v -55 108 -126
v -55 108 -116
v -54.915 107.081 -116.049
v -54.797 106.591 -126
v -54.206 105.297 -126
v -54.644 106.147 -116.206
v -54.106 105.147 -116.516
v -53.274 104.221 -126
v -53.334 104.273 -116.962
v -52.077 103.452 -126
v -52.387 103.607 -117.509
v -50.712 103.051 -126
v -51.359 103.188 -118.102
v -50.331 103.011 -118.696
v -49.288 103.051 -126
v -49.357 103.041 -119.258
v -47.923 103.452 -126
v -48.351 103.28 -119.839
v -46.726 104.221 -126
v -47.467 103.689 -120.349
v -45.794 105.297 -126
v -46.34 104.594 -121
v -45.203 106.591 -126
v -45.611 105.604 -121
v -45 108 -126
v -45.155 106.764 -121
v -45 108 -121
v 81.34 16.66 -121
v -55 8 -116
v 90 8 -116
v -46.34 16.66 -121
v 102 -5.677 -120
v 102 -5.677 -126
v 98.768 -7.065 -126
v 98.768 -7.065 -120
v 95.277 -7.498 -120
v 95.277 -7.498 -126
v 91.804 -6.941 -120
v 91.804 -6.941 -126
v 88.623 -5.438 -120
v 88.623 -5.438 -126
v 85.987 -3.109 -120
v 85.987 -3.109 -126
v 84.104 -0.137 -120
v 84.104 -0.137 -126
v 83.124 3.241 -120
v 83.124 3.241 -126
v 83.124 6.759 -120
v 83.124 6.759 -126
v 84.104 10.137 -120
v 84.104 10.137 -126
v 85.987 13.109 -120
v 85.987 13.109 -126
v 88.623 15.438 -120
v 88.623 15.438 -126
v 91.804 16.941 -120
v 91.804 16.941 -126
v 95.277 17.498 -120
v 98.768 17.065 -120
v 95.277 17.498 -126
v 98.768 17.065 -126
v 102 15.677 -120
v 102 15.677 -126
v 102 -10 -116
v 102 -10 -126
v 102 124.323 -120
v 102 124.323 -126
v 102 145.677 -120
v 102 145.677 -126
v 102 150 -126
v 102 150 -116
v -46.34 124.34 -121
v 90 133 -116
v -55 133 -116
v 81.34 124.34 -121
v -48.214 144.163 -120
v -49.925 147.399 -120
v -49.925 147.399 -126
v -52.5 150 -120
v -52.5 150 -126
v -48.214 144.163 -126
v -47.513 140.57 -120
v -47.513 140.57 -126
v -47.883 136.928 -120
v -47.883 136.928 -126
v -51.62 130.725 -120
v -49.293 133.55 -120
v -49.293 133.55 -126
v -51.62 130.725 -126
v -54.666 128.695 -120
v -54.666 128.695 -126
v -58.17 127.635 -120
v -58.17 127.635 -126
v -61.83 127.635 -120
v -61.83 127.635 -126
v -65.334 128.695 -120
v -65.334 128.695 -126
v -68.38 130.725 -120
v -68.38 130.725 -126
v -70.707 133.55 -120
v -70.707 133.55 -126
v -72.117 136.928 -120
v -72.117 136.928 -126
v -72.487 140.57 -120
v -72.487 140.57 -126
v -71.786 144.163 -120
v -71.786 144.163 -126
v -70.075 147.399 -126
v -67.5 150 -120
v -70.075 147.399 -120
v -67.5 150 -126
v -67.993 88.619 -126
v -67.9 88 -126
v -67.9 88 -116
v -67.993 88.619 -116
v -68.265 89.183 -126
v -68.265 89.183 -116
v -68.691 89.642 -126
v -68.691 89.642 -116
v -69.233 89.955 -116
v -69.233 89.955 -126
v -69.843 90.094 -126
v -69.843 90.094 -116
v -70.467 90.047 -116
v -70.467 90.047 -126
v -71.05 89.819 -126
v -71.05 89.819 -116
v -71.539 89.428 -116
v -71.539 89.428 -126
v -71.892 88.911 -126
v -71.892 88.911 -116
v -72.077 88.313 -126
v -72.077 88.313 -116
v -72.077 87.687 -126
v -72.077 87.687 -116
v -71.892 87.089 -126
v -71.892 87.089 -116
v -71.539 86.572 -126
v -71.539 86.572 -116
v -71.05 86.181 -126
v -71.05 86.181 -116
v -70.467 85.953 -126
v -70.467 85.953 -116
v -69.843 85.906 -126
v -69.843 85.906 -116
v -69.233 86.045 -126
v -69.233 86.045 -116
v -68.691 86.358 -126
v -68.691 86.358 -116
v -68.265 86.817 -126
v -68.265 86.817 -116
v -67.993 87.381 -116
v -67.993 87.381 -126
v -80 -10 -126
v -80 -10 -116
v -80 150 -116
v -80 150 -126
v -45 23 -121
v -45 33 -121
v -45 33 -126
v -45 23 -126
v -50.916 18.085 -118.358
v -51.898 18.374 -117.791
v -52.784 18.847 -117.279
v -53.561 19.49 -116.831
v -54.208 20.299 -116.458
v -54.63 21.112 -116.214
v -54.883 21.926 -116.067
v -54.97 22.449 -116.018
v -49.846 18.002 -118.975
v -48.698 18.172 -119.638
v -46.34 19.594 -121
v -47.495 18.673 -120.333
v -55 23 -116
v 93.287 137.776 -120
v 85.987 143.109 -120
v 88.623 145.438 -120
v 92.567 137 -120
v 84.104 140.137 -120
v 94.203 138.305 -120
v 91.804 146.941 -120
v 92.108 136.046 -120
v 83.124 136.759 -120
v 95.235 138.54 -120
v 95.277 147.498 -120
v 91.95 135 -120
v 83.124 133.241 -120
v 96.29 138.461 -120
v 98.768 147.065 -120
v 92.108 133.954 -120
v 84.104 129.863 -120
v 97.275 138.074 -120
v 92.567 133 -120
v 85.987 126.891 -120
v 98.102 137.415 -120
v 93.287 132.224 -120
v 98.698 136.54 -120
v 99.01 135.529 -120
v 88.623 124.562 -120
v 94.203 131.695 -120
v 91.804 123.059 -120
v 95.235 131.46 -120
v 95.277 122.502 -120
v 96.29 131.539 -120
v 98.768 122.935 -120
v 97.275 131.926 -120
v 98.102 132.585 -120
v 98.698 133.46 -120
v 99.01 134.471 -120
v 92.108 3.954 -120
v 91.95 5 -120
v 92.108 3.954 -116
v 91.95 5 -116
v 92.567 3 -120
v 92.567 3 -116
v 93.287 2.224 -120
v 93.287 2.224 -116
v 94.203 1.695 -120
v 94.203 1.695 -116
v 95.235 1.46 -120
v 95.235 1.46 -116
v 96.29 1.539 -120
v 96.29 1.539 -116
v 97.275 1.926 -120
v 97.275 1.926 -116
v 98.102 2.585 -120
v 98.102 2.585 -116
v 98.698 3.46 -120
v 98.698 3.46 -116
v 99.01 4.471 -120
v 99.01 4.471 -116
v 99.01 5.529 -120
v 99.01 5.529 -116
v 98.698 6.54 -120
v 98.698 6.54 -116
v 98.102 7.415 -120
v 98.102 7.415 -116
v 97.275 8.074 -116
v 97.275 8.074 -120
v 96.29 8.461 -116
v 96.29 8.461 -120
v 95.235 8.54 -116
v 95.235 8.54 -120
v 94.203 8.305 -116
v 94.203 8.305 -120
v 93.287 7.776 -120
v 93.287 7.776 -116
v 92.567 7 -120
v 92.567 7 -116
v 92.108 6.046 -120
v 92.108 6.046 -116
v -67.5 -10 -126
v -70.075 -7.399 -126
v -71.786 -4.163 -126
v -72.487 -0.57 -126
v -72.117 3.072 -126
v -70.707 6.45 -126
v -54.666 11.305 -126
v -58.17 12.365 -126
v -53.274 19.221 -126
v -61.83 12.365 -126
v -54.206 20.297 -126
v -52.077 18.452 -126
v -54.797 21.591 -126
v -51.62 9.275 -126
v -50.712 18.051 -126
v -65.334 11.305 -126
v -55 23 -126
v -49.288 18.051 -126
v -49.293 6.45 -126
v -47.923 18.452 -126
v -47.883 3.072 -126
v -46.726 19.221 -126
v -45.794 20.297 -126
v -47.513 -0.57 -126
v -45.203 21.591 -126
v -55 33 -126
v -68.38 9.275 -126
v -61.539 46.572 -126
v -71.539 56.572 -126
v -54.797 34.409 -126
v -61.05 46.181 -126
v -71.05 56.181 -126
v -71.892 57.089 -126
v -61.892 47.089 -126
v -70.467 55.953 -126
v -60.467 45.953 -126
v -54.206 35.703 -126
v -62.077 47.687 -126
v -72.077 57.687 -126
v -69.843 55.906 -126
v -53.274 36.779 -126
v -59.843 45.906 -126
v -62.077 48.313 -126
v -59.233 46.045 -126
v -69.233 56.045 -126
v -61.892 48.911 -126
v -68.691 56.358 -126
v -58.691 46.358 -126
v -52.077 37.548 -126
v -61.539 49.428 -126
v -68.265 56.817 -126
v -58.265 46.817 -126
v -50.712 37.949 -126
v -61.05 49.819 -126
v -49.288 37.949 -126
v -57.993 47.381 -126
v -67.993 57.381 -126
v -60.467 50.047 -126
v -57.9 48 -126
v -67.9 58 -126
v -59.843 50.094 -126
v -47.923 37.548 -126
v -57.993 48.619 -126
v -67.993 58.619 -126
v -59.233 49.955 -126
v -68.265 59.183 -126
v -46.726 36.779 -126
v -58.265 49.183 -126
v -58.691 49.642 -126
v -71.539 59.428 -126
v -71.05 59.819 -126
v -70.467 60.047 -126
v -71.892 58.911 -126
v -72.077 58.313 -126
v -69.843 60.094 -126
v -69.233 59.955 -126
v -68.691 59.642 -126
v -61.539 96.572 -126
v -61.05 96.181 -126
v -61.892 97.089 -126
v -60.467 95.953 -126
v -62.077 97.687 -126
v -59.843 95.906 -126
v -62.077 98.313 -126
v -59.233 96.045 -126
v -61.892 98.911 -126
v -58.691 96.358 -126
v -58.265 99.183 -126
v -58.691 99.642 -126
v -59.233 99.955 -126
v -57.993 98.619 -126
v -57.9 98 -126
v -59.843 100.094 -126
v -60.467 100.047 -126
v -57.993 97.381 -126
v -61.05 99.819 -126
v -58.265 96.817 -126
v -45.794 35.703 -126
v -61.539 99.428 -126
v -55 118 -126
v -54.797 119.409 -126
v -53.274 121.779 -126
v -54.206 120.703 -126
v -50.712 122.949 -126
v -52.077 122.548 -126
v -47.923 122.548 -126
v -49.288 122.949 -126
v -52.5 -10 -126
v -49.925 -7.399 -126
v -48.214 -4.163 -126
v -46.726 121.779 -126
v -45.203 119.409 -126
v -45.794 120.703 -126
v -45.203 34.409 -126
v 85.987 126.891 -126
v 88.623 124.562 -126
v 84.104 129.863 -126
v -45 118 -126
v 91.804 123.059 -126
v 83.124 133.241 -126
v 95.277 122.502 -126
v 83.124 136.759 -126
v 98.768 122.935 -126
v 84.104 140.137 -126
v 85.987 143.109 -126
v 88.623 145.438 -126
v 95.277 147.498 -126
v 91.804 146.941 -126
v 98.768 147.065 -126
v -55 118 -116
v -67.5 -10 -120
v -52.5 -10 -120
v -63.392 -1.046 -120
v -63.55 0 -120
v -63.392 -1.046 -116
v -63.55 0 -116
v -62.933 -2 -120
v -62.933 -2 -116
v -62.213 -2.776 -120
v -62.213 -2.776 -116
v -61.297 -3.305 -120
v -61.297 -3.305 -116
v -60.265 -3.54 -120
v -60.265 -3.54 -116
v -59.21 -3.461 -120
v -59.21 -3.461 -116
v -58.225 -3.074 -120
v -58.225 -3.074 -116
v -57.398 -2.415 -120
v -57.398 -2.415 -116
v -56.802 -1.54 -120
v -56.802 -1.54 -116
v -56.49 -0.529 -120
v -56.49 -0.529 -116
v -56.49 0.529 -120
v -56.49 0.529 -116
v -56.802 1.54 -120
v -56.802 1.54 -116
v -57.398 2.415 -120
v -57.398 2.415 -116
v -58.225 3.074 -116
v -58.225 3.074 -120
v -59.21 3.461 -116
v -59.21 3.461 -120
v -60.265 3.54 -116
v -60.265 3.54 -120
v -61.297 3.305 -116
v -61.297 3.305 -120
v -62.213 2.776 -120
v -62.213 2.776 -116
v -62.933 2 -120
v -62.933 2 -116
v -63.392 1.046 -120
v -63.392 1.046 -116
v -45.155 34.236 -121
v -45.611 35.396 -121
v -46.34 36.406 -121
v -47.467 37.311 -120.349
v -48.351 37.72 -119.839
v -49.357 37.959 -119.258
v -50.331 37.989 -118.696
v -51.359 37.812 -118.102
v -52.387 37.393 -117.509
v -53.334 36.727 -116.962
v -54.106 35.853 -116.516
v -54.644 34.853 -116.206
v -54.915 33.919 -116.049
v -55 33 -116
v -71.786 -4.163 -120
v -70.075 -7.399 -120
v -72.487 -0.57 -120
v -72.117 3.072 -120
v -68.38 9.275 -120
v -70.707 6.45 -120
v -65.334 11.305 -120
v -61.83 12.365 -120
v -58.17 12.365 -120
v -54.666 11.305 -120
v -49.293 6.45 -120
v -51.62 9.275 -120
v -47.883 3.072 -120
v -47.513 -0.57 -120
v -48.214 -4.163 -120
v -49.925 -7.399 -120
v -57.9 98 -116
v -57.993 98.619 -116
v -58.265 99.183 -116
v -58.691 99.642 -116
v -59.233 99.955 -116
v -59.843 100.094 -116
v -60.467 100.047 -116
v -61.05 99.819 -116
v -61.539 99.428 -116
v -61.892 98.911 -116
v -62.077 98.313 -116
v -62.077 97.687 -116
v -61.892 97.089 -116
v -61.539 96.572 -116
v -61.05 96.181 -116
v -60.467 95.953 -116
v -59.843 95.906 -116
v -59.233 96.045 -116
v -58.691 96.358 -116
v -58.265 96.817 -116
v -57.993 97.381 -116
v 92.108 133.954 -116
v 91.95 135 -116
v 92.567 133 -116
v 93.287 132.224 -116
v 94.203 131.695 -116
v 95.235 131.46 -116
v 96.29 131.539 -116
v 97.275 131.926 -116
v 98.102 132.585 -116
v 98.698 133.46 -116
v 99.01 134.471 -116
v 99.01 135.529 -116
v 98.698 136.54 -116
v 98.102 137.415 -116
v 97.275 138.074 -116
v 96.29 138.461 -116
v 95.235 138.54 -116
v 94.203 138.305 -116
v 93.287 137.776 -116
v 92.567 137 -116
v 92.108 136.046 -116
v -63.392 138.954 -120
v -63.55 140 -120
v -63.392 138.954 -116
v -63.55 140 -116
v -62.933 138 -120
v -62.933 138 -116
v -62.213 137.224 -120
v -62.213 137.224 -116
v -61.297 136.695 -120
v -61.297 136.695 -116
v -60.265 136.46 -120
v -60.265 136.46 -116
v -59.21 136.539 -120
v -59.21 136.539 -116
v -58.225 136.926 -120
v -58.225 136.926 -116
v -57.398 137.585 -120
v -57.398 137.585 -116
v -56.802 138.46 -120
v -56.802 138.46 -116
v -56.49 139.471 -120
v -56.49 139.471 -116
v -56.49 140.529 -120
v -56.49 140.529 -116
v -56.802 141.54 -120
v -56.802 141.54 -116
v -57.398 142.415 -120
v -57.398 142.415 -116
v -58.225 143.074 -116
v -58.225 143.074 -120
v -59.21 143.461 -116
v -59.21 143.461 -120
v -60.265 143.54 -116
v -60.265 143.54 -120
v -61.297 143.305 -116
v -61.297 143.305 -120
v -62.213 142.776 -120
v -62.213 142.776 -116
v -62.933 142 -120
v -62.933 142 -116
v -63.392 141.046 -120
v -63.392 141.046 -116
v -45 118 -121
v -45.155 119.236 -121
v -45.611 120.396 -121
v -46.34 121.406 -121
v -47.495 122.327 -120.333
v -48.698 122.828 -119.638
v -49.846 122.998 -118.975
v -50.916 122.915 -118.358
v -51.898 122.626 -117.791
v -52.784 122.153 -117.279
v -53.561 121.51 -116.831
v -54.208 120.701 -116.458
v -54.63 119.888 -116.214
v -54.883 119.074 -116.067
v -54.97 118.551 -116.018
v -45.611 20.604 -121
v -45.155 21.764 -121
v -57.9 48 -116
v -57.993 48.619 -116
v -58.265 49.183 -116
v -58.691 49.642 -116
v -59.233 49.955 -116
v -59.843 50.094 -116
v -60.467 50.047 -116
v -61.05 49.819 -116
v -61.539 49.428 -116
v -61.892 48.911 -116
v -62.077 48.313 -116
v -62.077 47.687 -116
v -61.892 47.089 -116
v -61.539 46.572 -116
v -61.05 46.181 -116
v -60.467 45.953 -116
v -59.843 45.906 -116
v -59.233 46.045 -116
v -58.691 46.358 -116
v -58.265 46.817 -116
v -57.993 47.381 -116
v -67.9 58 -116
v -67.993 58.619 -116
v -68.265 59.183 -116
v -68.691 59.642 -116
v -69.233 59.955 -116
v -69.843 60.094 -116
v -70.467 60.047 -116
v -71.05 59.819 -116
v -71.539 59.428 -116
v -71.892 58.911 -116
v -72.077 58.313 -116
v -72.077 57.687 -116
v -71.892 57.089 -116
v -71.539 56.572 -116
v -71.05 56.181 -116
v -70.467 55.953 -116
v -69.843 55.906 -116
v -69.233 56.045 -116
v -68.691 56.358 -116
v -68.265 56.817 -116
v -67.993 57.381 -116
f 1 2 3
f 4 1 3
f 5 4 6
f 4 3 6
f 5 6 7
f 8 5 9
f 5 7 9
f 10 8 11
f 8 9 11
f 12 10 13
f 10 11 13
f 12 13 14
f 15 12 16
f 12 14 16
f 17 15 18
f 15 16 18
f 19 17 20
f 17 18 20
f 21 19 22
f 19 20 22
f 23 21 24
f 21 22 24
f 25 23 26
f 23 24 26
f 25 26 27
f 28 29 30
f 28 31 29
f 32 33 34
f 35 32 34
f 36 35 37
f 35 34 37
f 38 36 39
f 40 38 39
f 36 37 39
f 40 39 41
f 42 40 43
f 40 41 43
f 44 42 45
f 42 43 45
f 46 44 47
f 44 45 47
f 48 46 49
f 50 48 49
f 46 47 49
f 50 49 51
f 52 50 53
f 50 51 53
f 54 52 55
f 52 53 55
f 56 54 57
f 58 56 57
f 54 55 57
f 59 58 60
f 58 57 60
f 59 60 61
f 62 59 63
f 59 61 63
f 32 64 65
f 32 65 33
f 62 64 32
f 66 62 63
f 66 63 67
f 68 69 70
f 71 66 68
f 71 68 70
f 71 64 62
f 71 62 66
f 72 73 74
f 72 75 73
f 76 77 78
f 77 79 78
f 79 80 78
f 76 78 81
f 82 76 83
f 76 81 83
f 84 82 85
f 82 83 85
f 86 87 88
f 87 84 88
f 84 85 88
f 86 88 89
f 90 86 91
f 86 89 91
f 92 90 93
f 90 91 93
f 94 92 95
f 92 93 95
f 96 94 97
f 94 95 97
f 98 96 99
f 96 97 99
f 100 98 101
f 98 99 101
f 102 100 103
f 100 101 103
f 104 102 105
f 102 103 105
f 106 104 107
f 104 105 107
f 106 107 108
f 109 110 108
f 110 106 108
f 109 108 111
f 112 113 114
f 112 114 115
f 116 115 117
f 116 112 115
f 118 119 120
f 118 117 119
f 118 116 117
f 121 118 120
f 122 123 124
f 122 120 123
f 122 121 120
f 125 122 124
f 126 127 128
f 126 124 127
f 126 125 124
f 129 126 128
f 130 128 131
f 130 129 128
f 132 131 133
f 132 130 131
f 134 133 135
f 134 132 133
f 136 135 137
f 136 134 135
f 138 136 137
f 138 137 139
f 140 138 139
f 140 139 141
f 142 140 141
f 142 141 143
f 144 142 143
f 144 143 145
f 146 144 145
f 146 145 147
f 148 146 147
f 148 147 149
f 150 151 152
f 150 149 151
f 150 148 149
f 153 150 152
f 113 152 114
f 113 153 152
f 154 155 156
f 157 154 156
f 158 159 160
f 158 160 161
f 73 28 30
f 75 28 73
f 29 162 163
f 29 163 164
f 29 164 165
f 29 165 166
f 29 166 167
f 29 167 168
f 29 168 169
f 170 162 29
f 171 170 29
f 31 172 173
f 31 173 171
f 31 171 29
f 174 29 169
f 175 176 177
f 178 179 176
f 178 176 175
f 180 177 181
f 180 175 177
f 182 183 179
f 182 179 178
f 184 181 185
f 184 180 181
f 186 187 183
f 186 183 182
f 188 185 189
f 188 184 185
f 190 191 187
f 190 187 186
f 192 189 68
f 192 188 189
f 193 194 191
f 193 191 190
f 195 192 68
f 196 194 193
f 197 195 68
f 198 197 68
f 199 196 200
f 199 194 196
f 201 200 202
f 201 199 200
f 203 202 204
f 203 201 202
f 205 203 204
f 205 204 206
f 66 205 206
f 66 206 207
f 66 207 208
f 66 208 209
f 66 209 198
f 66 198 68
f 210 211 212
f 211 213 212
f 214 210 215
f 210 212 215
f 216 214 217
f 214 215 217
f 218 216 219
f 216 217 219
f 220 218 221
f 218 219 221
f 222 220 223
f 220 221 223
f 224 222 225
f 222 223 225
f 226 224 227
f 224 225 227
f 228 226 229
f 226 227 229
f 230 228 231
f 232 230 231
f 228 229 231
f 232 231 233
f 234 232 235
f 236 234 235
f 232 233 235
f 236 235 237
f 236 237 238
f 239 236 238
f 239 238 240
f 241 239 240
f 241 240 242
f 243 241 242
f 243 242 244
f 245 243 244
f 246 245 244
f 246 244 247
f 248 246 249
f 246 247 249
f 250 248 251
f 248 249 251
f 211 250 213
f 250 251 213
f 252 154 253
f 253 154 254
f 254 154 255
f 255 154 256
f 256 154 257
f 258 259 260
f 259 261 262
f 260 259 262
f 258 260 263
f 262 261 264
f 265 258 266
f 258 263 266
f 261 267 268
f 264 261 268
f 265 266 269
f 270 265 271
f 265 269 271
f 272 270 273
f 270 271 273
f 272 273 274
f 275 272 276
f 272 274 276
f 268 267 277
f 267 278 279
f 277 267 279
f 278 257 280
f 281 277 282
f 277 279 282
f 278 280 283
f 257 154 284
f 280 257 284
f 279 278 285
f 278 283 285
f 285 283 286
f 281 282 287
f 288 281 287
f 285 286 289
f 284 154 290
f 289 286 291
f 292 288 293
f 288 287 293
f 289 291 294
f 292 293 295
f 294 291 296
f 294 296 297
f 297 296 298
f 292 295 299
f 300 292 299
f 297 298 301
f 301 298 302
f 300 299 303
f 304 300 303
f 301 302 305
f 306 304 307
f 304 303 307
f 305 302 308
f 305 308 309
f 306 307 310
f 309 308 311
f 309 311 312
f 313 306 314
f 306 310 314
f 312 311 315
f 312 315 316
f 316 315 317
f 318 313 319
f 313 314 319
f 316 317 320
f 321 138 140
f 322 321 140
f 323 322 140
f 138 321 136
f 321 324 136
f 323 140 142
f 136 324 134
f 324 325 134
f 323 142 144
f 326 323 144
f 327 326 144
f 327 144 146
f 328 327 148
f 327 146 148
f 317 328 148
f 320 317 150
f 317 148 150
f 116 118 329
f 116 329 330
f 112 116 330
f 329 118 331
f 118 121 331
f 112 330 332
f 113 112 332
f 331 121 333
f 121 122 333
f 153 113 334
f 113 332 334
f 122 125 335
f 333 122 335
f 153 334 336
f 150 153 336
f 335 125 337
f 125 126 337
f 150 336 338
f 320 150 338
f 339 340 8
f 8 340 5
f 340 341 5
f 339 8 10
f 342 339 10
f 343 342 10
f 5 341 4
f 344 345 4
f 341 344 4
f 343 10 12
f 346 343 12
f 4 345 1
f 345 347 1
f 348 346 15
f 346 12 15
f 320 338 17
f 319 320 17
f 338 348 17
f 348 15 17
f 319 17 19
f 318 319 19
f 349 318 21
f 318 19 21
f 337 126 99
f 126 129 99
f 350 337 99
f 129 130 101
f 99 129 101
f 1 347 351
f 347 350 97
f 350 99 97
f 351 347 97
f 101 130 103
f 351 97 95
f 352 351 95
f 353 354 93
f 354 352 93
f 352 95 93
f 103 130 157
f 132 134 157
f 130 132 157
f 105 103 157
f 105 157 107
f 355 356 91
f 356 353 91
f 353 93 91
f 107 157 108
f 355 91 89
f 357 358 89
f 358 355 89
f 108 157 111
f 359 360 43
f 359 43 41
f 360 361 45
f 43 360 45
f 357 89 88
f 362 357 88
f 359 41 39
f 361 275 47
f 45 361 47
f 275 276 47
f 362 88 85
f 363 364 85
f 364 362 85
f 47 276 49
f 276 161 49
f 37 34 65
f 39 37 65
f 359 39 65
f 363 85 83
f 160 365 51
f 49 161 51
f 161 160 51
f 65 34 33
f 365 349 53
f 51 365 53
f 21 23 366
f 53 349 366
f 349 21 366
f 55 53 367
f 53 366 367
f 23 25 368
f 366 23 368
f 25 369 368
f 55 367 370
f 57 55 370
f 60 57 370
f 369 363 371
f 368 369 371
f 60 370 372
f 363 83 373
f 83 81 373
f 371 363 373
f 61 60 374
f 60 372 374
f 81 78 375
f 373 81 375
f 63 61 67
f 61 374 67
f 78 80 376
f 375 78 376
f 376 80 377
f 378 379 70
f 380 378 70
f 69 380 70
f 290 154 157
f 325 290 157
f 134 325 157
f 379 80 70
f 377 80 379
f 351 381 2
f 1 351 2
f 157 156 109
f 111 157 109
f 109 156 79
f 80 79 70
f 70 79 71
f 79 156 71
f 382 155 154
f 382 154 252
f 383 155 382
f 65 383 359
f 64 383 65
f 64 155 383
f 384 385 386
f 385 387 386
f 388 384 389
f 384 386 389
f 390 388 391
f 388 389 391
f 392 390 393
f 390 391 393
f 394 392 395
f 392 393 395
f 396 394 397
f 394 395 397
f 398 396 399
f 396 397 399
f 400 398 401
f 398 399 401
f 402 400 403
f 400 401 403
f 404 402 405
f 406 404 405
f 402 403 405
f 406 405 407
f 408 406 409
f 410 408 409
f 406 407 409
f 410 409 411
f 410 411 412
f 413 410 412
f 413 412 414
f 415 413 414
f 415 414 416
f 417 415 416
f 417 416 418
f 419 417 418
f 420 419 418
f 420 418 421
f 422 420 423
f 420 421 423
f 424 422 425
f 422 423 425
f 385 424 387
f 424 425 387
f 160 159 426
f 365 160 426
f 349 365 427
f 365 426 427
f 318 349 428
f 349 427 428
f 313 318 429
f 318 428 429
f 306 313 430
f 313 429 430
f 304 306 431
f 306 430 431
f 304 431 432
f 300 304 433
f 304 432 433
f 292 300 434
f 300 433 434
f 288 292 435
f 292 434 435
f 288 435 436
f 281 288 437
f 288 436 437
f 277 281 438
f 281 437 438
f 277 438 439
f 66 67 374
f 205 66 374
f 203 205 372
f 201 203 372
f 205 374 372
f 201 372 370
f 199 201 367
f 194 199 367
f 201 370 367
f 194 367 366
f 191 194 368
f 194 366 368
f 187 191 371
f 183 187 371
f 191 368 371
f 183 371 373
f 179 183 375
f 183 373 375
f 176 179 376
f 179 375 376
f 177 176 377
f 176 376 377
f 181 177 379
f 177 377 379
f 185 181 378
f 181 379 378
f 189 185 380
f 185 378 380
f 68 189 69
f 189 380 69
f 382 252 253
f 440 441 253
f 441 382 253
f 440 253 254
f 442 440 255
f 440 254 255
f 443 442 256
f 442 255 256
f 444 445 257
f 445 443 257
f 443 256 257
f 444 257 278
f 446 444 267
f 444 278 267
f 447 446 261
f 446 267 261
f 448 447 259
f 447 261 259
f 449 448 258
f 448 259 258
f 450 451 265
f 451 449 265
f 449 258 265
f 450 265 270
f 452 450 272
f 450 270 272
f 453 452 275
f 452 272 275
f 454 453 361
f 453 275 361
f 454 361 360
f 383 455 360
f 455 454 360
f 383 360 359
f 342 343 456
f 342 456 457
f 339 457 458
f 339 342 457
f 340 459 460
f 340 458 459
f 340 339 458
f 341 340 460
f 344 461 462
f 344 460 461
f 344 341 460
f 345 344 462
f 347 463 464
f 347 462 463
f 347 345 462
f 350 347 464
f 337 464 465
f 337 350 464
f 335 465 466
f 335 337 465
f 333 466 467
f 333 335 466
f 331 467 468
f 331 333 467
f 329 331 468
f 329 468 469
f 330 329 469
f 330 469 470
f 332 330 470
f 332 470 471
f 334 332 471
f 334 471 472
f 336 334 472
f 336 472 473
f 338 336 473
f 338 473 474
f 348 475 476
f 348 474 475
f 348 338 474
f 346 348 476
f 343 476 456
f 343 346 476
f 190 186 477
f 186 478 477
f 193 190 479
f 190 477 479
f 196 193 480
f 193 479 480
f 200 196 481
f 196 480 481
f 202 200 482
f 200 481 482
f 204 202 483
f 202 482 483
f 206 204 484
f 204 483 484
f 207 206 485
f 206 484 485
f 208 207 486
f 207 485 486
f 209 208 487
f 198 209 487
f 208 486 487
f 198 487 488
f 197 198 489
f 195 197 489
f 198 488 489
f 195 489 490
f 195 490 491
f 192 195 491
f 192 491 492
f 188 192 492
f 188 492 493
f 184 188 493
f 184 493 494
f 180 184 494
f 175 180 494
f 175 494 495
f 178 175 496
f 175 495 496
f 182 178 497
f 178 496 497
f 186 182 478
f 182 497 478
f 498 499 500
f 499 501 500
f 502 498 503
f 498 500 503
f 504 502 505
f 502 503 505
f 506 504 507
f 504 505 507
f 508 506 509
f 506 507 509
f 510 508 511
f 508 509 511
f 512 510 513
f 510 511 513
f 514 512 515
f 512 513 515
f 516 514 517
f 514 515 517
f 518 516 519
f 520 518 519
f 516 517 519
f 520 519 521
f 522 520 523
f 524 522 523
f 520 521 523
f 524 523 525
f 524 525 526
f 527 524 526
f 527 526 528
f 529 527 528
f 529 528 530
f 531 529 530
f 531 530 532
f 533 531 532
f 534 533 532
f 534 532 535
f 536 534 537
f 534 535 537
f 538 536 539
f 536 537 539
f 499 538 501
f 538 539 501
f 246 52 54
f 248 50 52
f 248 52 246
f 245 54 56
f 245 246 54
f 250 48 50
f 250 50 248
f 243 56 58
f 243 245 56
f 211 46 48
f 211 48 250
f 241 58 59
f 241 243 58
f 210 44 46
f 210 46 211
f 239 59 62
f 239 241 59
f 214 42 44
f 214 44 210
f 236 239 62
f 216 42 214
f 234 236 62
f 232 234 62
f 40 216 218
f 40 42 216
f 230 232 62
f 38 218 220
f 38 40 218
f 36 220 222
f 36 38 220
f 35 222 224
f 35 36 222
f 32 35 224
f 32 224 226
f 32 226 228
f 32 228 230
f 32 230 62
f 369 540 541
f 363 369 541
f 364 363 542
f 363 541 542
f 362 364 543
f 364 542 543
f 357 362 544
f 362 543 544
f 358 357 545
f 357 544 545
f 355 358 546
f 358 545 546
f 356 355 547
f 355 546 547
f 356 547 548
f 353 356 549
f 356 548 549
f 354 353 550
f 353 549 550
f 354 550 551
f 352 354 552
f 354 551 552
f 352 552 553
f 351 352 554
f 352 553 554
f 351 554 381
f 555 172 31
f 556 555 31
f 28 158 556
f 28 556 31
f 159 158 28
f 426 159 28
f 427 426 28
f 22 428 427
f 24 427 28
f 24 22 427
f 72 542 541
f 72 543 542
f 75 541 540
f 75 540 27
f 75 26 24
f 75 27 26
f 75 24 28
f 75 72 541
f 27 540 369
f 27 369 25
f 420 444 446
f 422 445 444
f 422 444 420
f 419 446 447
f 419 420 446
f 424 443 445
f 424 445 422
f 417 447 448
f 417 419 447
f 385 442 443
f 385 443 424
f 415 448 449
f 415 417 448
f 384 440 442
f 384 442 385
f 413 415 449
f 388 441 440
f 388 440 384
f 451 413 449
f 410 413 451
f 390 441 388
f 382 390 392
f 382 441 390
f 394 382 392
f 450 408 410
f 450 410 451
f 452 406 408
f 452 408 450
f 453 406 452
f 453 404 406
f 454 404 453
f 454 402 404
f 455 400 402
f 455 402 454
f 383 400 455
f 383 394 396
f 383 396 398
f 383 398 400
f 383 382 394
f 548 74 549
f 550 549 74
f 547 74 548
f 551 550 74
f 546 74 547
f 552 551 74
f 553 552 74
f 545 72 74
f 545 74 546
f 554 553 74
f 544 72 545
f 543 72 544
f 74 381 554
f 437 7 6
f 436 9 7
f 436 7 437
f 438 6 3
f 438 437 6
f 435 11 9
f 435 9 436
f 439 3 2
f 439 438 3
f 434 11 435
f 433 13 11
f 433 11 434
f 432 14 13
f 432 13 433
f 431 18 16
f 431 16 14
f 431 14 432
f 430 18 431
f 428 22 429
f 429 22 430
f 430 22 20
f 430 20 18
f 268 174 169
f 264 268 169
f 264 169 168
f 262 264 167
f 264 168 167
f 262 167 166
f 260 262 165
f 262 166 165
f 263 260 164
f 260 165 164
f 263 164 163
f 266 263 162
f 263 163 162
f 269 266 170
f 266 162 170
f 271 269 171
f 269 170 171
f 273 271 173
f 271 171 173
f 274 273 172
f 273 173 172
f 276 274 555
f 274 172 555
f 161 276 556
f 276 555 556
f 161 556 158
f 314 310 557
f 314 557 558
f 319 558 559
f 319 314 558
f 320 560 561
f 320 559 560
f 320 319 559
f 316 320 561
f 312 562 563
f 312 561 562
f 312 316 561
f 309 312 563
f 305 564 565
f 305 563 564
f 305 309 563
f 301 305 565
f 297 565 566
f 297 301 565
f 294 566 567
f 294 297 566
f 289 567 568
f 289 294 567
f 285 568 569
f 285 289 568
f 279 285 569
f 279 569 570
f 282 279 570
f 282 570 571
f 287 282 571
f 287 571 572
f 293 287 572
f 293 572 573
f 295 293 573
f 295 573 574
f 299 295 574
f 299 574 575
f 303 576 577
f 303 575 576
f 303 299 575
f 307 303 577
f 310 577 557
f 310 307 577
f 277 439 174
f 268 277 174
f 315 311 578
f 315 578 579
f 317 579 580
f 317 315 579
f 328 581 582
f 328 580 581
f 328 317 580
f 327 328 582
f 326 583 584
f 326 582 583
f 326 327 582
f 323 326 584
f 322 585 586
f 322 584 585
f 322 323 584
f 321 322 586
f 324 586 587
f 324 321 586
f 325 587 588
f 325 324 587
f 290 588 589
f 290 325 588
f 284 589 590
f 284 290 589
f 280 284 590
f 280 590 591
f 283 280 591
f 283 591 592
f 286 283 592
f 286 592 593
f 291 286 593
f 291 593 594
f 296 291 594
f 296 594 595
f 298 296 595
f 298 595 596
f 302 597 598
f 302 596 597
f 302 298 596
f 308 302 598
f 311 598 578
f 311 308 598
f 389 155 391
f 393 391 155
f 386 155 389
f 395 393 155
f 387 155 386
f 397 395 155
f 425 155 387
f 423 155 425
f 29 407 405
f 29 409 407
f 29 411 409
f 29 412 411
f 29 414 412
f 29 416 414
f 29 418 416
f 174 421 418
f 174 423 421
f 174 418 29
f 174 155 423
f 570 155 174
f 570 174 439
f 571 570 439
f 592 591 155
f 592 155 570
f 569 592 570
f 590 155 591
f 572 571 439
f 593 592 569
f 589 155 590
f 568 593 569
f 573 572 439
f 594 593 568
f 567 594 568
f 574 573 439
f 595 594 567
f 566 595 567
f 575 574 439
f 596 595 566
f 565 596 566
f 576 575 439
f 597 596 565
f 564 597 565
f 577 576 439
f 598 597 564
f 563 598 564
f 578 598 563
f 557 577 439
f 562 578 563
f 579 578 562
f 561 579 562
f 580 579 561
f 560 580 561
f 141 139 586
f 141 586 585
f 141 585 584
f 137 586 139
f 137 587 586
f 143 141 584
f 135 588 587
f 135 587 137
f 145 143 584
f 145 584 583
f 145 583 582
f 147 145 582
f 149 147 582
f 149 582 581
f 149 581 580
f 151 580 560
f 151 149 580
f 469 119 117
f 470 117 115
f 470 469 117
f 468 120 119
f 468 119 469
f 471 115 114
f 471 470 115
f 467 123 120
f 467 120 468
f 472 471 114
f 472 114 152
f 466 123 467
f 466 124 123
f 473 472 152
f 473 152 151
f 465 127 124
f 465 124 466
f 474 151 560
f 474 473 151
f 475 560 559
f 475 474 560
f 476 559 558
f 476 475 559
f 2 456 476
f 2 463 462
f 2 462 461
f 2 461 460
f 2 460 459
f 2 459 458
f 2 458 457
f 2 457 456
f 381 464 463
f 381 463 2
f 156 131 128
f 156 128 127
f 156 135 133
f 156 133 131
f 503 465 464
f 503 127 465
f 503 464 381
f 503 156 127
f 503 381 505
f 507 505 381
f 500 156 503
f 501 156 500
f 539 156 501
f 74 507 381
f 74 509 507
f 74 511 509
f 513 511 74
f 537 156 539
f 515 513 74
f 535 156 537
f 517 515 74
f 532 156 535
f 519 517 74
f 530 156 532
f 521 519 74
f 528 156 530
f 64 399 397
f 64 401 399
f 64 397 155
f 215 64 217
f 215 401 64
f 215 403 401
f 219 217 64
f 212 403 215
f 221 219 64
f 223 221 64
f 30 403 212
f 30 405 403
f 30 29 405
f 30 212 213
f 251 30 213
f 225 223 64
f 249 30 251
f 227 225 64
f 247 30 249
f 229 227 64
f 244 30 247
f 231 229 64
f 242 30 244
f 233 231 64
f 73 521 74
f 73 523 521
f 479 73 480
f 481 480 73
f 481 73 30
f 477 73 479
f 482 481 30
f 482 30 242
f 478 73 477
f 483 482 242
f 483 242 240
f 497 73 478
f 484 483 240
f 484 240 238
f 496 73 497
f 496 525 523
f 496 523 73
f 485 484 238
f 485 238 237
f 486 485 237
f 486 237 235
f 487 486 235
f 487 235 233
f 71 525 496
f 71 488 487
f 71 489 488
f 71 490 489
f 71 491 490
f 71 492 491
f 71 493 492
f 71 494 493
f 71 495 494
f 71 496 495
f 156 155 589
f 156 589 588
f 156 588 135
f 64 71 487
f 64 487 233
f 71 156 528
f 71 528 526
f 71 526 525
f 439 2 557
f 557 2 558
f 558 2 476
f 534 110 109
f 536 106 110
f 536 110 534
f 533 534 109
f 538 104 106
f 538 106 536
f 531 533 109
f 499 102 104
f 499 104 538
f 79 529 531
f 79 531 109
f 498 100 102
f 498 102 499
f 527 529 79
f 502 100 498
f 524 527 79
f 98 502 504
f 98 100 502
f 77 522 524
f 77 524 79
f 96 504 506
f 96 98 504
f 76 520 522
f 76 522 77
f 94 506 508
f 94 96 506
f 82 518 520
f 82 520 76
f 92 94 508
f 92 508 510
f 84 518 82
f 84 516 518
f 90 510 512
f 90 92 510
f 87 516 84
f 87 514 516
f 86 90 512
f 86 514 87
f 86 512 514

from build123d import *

# Parameters (mm, degrees)
SKETCH014_W         = 182
SKETCH014_H         = 160
PAD007_DEPTH        = 10
HOLE006_D           = 7.1
HOLE006_DEPTH       = 52
HOLE006_CBORE_D     = 25
HOLE006_CBORE_DEPTH = 16
POCKET002_DEPTH     = 29
SKETCH018_W         = 145
SKETCH018_H         = 125
POCKET003_DEPTH     = 5
POCKET003_TAPER     = 60
SKETCH019_R         = 2.1
HOLE007_DEPTH       = 25


with BuildPart() as part:
    # Sketch014 → Pad007 (new body)
    with BuildSketch(Plane.XY):
        with Locations((91, 82)):
            Rectangle(SKETCH014_W, SKETCH014_H)
    extrude(amount=-PAD007_DEPTH)

    # Hole006
    with Locations(Plane(origin=(0, 0, -20), x_dir=(1, 0, 0), z_dir=(0, 0, -1))):
        with Locations((20, -152), (20, -12), (175.5, -147), (175.5, -17)):
            CounterBoreHole(HOLE006_D / 2, HOLE006_CBORE_D / 2, HOLE006_CBORE_DEPTH, depth=HOLE006_DEPTH)

    # Sketch017 → Pocket002 (cut)
    with BuildSketch(Plane.XY):
        with BuildLine():
            ThreePointArc((35, 130), (30, 135), (25, 130))
            Line((25, 130), (25, 120))
            ThreePointArc((25, 120), (30, 115), (35, 120))
            Line((35, 130), (35, 120))
        make_face()
        with BuildLine():
            ThreePointArc((35, 45), (30, 50), (25, 45))
            Line((25, 45), (25, 35))
            ThreePointArc((25, 35), (30, 30), (35, 35))
            Line((35, 45), (35, 35))
        make_face()
    extrude(amount=-POCKET002_DEPTH, mode=Mode.SUBTRACT)

    # Sketch018 → Pocket003 (cut)
    with BuildSketch(Plane.XY):
        with Locations((97.5, 82.5)):
            Rectangle(SKETCH018_W, SKETCH018_H)
    extrude(amount=-POCKET003_DEPTH, taper=POCKET003_TAPER, mode=Mode.SUBTRACT)

    # Sketch019 → Hole007 (cut)
    with BuildSketch(Plane.XY.offset(-20)):
        with Locations((20, 60)):
            Circle(SKETCH019_R)
        with Locations((20, 110)):
            Circle(SKETCH019_R)
        with Locations((10, 100)):
            Circle(SKETCH019_R)
        with Locations((10, 70)):
            Circle(SKETCH019_R)
    extrude(amount=HOLE007_DEPTH, mode=Mode.SUBTRACT)


with BuildPart() as part_1:
    # Body005 placement: moved
    add(part.part.moved(Location((-80, -12, -116))))


solid = part_1.part
